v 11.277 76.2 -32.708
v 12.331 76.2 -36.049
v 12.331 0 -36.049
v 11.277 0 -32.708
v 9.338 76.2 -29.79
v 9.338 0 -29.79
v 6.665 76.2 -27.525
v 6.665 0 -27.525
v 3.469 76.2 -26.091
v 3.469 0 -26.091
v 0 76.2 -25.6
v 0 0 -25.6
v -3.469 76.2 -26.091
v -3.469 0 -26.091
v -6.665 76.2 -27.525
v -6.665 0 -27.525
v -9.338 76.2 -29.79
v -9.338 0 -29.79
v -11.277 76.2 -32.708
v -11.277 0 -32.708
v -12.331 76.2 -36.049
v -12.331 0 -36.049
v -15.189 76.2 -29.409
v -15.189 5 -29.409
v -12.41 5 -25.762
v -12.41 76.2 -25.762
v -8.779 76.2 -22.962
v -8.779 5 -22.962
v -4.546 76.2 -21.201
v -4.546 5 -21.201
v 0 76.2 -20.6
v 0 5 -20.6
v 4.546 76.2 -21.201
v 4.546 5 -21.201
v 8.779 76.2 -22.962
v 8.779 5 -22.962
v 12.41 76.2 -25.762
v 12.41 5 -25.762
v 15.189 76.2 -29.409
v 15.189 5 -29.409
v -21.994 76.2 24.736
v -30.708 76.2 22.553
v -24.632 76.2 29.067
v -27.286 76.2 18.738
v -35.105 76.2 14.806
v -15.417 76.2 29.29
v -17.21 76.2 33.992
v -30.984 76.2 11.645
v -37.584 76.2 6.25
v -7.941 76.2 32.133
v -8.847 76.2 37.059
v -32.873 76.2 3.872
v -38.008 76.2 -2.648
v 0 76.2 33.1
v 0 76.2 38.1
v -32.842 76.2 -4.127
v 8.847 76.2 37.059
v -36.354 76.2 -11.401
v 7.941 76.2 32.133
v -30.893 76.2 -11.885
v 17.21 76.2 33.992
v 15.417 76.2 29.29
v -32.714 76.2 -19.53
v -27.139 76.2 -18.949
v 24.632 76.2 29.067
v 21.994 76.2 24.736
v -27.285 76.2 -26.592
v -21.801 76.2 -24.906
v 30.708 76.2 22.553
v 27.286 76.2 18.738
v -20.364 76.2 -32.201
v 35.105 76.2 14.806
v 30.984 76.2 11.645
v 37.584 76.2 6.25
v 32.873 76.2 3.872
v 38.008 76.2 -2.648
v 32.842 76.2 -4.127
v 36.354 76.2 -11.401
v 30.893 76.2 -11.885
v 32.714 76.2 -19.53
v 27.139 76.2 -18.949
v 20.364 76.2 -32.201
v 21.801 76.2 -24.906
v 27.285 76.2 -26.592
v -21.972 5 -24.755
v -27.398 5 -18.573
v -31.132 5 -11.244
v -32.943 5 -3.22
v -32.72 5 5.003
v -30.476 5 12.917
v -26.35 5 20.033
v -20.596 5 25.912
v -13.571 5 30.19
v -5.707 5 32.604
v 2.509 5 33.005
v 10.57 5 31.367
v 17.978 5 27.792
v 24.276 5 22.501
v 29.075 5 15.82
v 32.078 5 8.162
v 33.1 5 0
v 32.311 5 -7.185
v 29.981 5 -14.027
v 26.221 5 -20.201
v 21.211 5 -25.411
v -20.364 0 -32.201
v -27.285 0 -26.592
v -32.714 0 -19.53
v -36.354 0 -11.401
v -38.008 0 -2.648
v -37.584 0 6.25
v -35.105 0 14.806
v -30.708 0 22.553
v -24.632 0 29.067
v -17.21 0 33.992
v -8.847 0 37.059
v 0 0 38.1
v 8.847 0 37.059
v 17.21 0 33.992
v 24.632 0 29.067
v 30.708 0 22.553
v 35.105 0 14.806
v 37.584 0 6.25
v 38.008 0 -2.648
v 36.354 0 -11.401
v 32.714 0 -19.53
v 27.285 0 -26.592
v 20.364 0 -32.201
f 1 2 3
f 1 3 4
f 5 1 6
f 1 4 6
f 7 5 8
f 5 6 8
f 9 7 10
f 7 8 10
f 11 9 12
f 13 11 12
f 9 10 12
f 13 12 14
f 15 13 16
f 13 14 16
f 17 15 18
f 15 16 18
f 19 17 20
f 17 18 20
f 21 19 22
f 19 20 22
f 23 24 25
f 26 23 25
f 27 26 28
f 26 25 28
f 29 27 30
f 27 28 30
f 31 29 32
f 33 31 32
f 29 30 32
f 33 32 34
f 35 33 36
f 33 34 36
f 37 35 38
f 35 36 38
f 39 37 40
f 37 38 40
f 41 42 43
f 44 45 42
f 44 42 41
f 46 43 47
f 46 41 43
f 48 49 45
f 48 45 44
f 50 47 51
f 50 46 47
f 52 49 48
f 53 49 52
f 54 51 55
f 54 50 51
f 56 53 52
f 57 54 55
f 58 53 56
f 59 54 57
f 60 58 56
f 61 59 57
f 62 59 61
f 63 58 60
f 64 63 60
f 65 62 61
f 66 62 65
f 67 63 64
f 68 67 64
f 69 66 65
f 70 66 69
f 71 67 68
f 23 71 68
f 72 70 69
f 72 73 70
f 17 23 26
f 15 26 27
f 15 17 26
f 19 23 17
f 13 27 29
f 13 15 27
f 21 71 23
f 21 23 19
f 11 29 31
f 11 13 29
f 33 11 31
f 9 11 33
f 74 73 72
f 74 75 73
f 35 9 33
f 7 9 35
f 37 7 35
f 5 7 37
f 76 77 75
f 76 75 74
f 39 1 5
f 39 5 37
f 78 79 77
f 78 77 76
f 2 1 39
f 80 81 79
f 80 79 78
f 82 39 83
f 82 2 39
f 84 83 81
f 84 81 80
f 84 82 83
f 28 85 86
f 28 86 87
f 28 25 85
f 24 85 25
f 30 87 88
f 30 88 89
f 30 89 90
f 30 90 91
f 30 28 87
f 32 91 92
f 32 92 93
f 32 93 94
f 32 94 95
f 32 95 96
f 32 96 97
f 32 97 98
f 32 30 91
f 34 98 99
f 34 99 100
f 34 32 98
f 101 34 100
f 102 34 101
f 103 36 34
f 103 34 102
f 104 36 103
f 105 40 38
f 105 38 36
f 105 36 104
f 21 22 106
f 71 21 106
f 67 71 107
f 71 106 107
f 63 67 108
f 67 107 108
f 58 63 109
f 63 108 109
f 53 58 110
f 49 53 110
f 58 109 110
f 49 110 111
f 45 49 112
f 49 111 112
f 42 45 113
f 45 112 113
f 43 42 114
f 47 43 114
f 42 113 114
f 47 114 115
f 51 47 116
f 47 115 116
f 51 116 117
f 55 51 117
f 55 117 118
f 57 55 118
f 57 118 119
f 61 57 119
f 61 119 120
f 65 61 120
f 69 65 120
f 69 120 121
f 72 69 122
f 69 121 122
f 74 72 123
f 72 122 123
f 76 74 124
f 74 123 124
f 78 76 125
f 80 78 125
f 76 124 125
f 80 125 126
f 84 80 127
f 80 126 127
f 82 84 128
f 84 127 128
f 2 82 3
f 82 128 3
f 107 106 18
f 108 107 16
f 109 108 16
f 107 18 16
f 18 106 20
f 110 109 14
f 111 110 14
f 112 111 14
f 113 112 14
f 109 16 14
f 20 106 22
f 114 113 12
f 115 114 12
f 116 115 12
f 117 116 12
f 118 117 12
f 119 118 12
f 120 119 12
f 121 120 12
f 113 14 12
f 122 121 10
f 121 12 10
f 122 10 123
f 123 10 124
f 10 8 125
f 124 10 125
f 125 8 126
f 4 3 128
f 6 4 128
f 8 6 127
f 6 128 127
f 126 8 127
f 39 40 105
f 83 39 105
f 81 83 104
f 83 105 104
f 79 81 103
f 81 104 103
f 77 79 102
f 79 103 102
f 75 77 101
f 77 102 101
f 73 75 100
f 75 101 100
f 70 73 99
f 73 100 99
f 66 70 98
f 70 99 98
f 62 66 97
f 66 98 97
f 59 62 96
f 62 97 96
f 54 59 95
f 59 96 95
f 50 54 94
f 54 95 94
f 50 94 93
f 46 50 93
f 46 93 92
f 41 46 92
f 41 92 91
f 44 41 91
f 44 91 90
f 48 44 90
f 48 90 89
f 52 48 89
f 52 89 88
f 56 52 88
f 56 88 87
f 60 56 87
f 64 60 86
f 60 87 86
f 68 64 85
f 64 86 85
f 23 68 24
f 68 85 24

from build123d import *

# Parameters (mm, degrees)
BOSS_EXTRUDE1_DEPTH = 76.2
BOSS_EXTRUDE2_DEPTH = 5


with BuildPart() as part:
    # Sketch1 → Boss-Extrude1 (new body)
    with BuildSketch(Plane(origin=(0, 0, 0), x_dir=(1, 0, 0), z_dir=(0, 1, 0))):
        with BuildLine():
            ThreePointArc((12.330666952, 36.049475066), (0, 25.6), (-12.330666952, 36.049475066))
            ThreePointArc((-12.330666953, 36.049475066), (0, -38.1), (12.330666953, 36.049475066))
        make_face()
        with BuildLine():
            ThreePointArc((15.189386988, 29.409055118), (0, -33.1), (-15.189386988, 29.409055118))
            ThreePointArc((-15.189386988, 29.409055118), (0, 20.6), (15.189386988, 29.409055118))
        make_face(mode=Mode.SUBTRACT)
    extrude(amount=BOSS_EXTRUDE1_DEPTH)

    # Sketch1<3> → Boss-Extrude2 (add)
    with BuildSketch(Plane(origin=(0, 0, 0), x_dir=(1, 0, 0), z_dir=(0, 1, 0))):
        with BuildLine():
            ThreePointArc((33.1, 0), (28.269937295, 17.216870951), (15.189386988, 29.409055118))
            ThreePointArc((15.189386988, 29.409055118), (0, 20.6), (-15.189386988, 29.409055118))
            ThreePointArc((-15.189386988, 29.409055118), (-17.216870951, -28.269937295), (33.1, 0))
        make_face()
    extrude(amount=BOSS_EXTRUDE2_DEPTH)


solid = part.part
